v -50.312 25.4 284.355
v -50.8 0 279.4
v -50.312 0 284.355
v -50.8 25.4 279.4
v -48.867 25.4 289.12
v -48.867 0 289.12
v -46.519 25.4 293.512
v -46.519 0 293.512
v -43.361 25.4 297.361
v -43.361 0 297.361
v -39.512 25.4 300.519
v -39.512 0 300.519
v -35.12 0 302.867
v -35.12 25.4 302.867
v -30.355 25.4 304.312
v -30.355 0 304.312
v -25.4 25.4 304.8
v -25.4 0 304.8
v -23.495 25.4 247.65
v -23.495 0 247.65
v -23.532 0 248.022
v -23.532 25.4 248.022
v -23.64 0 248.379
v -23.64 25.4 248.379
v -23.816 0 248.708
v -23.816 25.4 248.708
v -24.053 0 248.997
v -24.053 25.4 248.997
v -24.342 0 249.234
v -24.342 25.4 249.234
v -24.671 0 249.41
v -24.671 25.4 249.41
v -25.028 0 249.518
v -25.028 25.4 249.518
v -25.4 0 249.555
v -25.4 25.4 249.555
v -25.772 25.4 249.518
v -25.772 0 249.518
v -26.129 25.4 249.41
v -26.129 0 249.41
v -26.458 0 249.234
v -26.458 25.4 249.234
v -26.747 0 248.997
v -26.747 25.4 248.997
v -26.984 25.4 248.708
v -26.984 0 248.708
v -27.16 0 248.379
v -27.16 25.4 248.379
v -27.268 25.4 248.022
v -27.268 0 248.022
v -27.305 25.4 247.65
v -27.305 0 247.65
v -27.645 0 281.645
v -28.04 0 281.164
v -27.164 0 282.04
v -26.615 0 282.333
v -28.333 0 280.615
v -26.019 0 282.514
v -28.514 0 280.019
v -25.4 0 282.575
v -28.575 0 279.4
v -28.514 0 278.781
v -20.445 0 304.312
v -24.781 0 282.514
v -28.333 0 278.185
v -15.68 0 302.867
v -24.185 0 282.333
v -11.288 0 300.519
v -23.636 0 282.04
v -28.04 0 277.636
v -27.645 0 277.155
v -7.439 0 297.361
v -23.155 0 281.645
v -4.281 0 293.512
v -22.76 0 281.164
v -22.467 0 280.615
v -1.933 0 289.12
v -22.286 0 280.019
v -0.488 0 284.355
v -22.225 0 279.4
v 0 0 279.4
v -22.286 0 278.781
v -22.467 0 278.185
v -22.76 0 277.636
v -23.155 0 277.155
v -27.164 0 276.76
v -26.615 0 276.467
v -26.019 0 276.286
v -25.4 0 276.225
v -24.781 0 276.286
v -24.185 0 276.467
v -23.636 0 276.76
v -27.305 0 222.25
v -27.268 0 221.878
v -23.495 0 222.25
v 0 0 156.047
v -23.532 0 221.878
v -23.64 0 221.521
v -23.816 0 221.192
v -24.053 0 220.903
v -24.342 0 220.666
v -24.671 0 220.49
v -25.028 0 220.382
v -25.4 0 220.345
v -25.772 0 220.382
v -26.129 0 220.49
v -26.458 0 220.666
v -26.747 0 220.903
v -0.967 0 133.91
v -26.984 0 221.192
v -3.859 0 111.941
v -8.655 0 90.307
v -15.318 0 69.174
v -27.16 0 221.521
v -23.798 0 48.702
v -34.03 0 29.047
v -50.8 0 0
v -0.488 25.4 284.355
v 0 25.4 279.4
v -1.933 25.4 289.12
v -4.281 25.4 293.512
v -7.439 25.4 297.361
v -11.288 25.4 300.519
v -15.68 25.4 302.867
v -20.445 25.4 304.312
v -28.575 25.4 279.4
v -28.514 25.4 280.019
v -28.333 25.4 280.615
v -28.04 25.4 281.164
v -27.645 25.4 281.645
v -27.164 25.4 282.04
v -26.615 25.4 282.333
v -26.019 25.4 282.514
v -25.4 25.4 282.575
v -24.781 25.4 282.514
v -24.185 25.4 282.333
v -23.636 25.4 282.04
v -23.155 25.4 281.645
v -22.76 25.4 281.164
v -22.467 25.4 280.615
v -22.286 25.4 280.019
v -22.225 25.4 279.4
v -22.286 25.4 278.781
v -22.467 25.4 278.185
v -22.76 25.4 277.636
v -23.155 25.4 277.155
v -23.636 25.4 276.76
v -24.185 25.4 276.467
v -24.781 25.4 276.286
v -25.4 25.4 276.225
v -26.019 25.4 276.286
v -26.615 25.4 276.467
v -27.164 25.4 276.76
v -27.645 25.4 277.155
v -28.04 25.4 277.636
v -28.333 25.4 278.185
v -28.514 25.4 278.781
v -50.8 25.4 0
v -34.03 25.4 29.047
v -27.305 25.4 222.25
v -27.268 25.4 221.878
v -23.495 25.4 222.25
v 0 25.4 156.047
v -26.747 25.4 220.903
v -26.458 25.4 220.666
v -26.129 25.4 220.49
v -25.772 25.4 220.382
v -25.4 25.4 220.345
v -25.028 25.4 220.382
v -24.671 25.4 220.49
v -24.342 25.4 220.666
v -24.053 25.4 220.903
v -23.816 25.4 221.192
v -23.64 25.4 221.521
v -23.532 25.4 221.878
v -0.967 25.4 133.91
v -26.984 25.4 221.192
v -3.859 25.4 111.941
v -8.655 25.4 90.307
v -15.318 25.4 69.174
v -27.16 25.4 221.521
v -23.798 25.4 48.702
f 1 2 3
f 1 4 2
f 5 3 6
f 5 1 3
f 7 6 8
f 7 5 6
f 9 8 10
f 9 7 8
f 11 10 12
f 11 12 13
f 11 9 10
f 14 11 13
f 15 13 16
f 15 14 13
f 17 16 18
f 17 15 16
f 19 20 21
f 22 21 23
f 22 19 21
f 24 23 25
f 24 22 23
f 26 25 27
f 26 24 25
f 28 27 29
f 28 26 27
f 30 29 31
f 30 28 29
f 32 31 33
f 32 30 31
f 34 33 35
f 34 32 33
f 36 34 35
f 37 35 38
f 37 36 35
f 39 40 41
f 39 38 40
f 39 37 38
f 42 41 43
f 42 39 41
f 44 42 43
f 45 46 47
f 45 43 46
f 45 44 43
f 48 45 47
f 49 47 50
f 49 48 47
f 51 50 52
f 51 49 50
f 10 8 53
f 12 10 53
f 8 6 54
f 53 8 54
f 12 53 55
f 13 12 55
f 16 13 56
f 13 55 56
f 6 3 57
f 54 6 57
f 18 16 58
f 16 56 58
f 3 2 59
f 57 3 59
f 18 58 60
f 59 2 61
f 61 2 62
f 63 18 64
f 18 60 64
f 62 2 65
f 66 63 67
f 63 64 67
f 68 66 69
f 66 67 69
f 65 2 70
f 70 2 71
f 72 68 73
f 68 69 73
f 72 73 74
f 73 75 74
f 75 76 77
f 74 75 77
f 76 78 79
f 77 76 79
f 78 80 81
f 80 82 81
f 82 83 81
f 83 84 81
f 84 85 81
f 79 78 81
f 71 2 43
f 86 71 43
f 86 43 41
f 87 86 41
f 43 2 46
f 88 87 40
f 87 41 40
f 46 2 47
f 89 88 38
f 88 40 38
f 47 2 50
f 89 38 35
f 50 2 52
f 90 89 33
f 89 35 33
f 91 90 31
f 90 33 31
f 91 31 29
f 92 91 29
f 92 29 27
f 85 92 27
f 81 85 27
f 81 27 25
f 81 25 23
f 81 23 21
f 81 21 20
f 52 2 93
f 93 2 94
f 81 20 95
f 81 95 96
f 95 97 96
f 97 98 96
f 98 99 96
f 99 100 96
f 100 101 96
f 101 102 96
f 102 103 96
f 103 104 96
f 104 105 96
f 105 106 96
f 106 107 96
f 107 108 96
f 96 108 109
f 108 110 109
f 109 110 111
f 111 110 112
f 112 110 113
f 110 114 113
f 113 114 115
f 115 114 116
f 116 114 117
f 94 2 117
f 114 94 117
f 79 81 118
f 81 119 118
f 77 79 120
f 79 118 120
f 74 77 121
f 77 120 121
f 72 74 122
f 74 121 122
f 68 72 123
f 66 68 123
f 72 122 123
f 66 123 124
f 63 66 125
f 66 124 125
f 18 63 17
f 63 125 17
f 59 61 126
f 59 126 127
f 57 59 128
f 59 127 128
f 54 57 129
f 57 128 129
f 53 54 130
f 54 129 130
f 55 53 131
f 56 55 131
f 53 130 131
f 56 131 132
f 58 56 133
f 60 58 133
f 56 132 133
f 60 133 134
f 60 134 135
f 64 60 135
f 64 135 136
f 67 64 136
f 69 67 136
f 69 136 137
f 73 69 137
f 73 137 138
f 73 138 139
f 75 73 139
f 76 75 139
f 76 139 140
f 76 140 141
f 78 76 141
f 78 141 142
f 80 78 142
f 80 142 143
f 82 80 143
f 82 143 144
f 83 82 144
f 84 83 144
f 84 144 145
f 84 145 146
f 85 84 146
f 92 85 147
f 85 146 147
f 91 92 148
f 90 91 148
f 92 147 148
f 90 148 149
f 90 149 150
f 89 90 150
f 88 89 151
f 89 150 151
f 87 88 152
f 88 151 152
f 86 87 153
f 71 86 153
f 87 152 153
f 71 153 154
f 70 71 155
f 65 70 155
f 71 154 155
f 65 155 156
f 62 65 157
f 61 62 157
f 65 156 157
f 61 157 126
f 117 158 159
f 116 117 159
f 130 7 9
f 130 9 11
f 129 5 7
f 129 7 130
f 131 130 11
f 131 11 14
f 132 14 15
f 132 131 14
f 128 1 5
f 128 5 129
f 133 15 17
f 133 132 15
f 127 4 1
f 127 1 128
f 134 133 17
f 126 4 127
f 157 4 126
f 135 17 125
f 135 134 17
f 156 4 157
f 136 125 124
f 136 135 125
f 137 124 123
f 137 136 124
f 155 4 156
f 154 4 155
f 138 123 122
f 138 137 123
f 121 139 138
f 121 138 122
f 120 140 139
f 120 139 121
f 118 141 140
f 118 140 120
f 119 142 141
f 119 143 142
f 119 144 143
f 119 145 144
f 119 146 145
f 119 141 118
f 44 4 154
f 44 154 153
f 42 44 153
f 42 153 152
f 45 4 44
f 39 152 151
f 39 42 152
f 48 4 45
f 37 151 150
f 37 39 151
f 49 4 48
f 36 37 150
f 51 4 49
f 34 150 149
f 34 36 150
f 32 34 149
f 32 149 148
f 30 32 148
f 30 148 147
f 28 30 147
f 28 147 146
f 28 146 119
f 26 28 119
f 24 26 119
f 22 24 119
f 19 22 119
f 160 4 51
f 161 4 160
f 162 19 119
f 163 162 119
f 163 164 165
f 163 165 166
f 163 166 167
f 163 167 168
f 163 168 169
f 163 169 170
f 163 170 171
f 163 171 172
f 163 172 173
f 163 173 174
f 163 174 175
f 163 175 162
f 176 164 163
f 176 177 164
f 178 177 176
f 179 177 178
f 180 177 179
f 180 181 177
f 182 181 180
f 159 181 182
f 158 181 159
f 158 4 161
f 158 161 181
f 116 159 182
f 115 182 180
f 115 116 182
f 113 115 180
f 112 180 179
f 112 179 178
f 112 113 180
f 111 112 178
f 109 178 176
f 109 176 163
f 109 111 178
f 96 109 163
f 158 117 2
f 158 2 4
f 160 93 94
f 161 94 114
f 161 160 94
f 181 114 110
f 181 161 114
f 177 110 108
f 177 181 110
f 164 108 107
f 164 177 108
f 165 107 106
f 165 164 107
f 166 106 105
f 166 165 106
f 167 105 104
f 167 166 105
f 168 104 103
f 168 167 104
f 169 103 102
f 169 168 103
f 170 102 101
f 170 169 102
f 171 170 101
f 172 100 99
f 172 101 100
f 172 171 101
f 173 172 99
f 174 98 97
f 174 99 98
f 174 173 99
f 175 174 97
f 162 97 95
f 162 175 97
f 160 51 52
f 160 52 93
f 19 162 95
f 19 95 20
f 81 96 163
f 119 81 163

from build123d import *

# Parameters (mm, degrees)
SKETCH1_W           = 50.8
SKETCH1_H           = 25.4
BOSS_EXTRUDE1_DEPTH = 304.8
FILLET1_R           = 25.4
CUT_EXTRUDE1_DEPTH  = 311.04651264
FILLET2_R           = 254
SKETCH7_R           = 3.175
CUT_EXTRUDE2_DEPTH  = 311.04651264
CUT_EXTRUDE3_DEPTH  = 311.04651264


with BuildPart() as part:
    # Sketch1 → Boss-Extrude1 (new body)
    with BuildSketch(Plane.XY):
        with Locations((-25.4, 12.7)):
            Rectangle(SKETCH1_W, SKETCH1_H)
    extrude(amount=BOSS_EXTRUDE1_DEPTH)

    # Fillet1
    fillet1_edges = [part.edges().sort_by_distance(p)[0] for p in [
        (0, 12.7, 304.8),
        (-50.8, 12.7, 304.8),
    ]]
    fillet(fillet1_edges, radius=FILLET1_R - 0.0001)  # a hair under: the kernel refuses the full size

    # Sketch6 → Cut-Extrude1 (cut, through all)
    with BuildSketch(Plane(origin=(0, 25.4, 0), x_dir=(1, 0, 0), z_dir=(0, 1, 0))):
        Polygon((-50.8, 0), (0, -87.988181024), (0, 0), align=None)
    extrude(amount=-CUT_EXTRUDE1_DEPTH, mode=Mode.SUBTRACT)

    # Fillet2
    fillet2_edges = [part.edges().sort_by_distance(p)[0] for p in [
        (0, 12.7, 87.988181024),
    ]]
    fillet(fillet2_edges, radius=FILLET2_R)

    # Sketch7 → Cut-Extrude2 (cut, through all)
    with BuildSketch(Plane(origin=(0, 25.4, 0), x_dir=(1, 0, 0), z_dir=(0, 1, 0))):
        with Locations(Location((-25.4, -279.4, 0), (0, 0, 180))):
            Circle(SKETCH7_R)
    extrude(amount=-CUT_EXTRUDE2_DEPTH, mode=Mode.SUBTRACT)

    # Sketch8 → Cut-Extrude3 (cut, through all)
    with BuildSketch(Plane(origin=(0, 25.4, 0), x_dir=(1, 0, 0), z_dir=(0, 1, 0))):
        with BuildLine():
            Line((-27.305, -247.65), (-27.305, -222.25))
            ThreePointArc((-27.305, -222.25), (-25.4, -220.345), (-23.495, -222.25))
            Line((-23.495, -222.25), (-23.495, -247.65))
            ThreePointArc((-23.495, -247.65), (-25.4, -249.555), (-27.305, -247.65))
        make_face()
    extrude(amount=-CUT_EXTRUDE3_DEPTH, mode=Mode.SUBTRACT)


solid = part.part
